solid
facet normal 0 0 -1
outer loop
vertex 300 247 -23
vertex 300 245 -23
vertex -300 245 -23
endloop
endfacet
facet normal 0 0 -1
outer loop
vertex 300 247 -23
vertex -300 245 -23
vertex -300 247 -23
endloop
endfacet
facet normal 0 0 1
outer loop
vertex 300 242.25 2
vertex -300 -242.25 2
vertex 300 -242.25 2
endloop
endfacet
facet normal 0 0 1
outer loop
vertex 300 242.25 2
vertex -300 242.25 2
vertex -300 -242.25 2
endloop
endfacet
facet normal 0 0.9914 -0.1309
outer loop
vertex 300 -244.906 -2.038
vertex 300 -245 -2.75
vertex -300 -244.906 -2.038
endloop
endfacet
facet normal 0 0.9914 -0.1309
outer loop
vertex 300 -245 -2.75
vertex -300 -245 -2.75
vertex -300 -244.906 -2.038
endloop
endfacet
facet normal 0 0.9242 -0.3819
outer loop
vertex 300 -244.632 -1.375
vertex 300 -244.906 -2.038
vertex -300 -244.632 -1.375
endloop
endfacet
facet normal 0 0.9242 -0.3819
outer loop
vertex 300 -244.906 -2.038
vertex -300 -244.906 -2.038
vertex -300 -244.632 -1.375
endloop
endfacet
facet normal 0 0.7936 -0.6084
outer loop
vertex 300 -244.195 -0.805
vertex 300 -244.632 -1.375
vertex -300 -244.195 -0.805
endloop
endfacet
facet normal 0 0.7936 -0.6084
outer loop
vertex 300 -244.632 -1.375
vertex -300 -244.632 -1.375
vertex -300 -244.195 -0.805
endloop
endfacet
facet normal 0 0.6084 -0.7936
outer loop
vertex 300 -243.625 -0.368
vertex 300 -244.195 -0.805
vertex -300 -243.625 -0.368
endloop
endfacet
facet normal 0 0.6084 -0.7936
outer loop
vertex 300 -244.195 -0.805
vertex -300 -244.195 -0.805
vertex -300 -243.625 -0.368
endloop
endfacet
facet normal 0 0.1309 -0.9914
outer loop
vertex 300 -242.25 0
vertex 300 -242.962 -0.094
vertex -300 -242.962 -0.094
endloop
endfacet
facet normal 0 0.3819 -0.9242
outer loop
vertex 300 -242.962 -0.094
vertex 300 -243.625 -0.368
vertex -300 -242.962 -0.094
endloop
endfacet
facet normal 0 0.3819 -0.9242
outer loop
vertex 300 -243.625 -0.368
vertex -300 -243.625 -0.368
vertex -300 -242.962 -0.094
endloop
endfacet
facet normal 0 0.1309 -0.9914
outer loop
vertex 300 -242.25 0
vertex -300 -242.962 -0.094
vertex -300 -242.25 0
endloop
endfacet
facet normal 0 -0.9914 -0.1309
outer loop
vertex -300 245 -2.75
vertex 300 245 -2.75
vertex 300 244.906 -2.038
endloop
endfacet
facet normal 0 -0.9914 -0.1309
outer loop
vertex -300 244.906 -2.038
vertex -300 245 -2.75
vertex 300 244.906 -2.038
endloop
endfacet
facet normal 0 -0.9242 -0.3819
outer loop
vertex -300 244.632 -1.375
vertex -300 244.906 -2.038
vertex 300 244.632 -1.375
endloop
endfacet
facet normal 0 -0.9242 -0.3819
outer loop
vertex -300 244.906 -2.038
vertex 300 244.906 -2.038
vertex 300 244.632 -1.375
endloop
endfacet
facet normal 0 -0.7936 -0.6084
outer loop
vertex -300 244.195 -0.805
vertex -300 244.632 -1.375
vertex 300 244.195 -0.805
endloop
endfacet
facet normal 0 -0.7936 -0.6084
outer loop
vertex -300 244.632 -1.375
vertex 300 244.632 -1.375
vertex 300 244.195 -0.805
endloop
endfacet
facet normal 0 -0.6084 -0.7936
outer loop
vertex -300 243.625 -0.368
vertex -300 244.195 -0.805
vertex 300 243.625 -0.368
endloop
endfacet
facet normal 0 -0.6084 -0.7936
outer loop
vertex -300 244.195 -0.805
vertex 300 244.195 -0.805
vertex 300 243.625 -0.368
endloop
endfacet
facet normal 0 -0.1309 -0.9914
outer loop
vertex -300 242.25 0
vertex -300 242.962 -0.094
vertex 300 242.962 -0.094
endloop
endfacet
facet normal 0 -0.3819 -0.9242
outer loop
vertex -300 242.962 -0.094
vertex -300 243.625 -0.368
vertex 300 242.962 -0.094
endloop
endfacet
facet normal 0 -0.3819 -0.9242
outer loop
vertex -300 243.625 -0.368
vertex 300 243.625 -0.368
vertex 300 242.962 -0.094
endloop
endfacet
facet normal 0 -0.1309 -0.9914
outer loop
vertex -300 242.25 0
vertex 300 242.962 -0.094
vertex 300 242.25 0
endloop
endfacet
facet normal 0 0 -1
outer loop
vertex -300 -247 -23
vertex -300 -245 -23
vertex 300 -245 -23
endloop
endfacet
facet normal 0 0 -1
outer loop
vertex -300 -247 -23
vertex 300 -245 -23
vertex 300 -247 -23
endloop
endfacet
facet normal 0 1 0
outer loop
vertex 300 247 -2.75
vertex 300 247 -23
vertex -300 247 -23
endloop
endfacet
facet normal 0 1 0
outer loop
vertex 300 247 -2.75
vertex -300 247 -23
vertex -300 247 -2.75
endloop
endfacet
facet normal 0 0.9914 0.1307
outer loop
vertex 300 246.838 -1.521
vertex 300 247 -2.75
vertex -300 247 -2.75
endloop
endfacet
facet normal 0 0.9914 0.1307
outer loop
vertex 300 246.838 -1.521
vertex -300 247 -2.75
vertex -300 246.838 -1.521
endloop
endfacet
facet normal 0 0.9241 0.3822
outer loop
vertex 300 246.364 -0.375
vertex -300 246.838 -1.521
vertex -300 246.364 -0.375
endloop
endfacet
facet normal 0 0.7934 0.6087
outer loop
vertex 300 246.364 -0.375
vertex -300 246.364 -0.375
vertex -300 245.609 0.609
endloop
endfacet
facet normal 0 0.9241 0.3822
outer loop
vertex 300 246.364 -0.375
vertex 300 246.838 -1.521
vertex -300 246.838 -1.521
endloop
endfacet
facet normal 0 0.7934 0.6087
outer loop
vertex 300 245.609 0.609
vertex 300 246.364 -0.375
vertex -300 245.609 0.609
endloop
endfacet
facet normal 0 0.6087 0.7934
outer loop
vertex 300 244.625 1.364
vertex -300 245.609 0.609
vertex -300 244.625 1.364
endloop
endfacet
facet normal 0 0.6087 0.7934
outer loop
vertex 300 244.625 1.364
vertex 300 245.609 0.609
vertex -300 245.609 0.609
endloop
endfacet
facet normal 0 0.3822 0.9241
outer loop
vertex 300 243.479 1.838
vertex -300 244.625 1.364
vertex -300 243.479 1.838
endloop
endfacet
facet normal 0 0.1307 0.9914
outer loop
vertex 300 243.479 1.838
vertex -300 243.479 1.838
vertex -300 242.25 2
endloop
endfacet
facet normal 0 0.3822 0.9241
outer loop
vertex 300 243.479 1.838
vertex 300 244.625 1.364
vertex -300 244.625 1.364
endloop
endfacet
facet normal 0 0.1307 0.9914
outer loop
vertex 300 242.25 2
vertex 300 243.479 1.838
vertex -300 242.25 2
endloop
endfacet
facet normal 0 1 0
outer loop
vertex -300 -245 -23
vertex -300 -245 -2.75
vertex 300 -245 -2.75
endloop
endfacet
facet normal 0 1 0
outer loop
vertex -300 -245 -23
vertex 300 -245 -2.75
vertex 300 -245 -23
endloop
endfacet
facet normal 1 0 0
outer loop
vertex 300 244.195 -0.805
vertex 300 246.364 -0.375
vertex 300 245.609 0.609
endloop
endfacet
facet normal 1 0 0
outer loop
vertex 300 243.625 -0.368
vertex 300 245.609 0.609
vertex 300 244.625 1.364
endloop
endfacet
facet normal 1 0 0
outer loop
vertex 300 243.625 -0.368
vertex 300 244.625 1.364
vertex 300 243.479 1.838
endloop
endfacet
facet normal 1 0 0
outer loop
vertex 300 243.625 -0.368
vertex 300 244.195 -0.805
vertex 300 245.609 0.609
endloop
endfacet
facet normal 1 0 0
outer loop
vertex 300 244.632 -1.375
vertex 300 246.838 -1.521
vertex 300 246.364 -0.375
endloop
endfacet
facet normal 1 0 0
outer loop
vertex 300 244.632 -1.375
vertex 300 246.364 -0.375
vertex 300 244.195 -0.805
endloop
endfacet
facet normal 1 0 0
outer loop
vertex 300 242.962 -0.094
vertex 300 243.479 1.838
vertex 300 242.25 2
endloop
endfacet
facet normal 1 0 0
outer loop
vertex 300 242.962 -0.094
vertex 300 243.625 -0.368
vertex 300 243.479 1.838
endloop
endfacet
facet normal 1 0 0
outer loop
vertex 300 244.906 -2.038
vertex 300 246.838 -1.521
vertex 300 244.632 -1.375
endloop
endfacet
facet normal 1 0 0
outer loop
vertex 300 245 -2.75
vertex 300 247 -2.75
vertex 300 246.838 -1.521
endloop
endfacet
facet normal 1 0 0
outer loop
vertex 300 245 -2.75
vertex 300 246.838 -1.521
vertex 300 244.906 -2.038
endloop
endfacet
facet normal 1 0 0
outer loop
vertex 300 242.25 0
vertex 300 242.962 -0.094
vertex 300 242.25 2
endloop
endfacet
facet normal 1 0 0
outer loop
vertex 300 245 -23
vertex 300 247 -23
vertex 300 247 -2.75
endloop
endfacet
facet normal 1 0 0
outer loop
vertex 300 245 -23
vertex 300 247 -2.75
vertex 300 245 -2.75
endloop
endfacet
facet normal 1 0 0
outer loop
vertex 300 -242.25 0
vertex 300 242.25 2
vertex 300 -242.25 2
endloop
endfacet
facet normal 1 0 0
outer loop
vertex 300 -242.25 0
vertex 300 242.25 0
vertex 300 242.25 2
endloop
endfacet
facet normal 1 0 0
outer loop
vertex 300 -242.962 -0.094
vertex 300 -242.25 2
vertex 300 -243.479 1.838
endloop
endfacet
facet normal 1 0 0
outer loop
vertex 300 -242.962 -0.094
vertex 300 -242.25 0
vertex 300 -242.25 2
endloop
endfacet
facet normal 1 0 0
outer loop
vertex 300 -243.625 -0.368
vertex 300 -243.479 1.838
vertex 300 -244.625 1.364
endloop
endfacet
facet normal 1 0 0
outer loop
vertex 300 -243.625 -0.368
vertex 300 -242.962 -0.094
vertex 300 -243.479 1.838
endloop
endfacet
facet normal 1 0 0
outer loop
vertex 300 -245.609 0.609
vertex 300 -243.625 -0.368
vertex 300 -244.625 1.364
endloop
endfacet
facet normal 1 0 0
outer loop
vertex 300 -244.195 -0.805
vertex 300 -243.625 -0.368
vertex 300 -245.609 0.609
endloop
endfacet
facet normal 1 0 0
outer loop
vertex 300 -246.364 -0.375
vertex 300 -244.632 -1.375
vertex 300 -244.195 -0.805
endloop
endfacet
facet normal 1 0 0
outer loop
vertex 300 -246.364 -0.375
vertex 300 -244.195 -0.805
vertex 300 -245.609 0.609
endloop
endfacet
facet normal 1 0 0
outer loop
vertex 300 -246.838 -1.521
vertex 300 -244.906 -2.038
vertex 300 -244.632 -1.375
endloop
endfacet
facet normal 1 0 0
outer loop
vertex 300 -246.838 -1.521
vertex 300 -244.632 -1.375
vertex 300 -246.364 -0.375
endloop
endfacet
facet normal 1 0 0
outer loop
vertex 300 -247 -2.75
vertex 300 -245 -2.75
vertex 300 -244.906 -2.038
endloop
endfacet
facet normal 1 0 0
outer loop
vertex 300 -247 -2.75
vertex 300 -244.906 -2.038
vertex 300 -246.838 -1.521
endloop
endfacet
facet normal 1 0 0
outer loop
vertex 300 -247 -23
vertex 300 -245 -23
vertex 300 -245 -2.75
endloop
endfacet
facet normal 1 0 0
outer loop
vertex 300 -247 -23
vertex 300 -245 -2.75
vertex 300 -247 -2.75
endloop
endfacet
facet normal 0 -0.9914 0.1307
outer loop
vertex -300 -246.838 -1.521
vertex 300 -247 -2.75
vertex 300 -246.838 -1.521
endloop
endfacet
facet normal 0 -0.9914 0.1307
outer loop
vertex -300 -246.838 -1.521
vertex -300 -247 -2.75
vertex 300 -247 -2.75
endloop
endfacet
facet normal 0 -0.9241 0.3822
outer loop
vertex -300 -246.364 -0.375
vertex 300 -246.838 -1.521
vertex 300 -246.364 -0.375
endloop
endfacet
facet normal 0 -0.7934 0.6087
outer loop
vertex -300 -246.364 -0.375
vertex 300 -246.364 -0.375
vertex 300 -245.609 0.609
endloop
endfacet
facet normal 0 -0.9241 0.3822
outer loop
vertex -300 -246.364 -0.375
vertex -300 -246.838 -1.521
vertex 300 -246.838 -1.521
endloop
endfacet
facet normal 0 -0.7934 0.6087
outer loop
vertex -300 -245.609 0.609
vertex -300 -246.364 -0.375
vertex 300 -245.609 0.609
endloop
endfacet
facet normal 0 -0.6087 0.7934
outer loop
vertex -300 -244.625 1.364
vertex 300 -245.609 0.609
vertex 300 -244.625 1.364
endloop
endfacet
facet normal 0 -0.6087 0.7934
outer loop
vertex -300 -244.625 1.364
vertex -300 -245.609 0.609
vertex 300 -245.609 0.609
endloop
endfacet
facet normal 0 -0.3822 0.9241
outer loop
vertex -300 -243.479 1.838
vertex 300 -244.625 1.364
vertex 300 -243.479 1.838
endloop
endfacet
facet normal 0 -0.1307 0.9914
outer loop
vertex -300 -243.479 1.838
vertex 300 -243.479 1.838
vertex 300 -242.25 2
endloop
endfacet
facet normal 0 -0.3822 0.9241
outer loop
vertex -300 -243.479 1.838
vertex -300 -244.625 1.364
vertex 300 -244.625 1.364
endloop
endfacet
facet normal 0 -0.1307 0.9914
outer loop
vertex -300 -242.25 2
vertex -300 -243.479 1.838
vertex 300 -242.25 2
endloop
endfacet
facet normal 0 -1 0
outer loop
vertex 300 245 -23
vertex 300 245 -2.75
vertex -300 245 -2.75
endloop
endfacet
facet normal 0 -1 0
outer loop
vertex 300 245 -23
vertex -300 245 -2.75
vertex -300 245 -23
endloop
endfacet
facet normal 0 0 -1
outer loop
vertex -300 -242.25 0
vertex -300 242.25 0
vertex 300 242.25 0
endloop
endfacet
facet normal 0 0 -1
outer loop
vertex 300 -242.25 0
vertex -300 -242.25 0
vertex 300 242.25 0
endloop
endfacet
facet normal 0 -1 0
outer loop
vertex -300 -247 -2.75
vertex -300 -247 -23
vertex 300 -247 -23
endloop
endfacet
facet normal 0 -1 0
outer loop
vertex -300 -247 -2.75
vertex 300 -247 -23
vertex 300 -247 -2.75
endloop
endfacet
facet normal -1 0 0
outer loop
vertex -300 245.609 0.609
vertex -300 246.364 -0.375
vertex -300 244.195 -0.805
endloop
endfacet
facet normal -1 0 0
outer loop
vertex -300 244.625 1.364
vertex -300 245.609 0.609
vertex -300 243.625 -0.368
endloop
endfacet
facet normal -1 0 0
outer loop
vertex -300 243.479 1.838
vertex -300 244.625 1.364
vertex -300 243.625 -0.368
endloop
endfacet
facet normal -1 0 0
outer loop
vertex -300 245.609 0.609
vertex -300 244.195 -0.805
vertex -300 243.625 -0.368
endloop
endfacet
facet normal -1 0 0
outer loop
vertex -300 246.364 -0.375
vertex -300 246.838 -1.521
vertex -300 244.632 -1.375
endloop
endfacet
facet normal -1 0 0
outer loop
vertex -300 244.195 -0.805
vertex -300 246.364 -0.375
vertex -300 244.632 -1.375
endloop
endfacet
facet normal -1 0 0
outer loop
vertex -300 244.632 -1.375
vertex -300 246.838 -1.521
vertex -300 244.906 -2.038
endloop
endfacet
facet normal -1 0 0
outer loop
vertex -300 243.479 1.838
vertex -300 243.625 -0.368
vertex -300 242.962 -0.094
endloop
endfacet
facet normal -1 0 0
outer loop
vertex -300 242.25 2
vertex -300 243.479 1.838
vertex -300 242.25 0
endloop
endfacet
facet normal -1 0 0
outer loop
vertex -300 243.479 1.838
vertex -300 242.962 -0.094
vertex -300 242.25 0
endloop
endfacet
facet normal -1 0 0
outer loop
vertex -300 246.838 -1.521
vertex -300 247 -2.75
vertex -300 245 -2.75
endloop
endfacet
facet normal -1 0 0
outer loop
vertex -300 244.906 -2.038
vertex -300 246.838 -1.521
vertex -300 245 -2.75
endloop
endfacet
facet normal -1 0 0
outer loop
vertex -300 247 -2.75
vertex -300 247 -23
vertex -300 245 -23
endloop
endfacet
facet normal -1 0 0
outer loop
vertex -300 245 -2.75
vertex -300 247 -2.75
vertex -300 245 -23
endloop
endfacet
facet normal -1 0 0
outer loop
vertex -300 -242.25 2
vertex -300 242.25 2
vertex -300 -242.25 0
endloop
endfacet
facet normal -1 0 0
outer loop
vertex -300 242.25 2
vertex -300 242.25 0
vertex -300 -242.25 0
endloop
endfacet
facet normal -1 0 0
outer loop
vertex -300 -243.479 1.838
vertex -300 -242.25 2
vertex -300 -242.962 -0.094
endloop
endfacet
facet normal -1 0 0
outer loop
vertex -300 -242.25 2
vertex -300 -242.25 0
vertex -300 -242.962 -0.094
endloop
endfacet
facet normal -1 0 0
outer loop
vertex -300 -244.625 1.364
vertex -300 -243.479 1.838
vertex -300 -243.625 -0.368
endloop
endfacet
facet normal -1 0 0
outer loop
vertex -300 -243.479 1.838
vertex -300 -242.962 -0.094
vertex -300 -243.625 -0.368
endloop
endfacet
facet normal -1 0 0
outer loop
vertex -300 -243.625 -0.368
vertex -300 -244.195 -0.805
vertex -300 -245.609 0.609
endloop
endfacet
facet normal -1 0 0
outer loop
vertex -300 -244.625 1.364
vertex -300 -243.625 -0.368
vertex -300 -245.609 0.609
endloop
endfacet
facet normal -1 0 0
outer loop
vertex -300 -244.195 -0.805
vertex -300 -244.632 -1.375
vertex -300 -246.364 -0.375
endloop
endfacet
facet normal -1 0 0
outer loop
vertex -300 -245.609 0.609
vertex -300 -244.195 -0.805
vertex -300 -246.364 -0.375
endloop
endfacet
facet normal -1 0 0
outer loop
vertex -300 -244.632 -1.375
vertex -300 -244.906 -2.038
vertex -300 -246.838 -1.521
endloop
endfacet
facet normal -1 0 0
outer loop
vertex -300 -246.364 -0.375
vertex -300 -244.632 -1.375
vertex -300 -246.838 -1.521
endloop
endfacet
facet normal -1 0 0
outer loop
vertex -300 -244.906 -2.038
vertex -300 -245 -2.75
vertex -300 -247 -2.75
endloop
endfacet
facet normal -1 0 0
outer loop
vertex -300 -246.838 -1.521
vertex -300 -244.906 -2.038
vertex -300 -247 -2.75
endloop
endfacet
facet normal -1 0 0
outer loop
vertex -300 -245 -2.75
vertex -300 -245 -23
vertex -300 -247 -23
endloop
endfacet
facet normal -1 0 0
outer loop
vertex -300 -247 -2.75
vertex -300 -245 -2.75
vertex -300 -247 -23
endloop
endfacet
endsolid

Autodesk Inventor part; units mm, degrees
ref_plane "YZ Plane" through (0, 0, 0) normal (1, 0, 0) x (0, 1, 0)
ref_plane "XZ Plane" through (0, 0, 0) normal (0, 1, 0) x (-1, 0, 0)
ref_plane "XY Plane" through (0, 0, 0) normal (0, 0, 1) x (1, 0, 0)
sketch "Sketch1" plane through (0, 0, 0) normal (0, 0, 1) x (1, 0, 0)
  line L0 (-300, -245) -> (300, -245)
  line L1 (300, -245) -> (300, 245)
  line L2 (300, 245) -> (-300, 245)
  line L3 (-300, 245) -> (-300, -245)
  line L4 (-300, -245) -> (300, 245) construction
  line L5 (300, -245) -> (-300, 245) construction
  point P0 (0, 0)
  dimension "d0" = 600
  dimension "d1" = 490
extrude "Plate1" add sketch "Sketch1" along normal blind 2
sketch "Sketch2" plane through (0, 0, 0) normal (0, 0, -1) x (-1, 0, 0)
  line L0 (-280, 225) -> (-80, 225) construction
  line L1 (-80, 225) -> (-80, 205) construction
  line L2 (-80, 205) -> (-280, 205) construction
  line L3 (-280, 205) -> (-280, 225) construction
  line L4 (-300, 245) -> (300, 245) projected
  line L5 (-300, -245) -> (-300, 245) projected
  point P0 (0, 0)
  point P1 (-48, 100)
  point P2 (300, 245)
  point P3 (-50, 98)
  dimension "d6" = 200
  dimension "d9" = 20
  dimension "d10" = 20
  dimension "d11" = 20
mark "Mark1"
sketch "Sketch3" plane through (-300, 247, 2) normal (0, -1, 0) x (1, 0, 0)
  line L0 (600, 0) -> (0, 0)
  line L1 (0, 0) -> (0, 25)
  line L2 (0, 25) -> (600, 25)
  line L3 (600, 25) -> (600, 0)
edge flange "Flange1" height 25 angle 90 thickness 2 bend radius 2.75 thickness toward (0, -1, 0) relief round relief width 2 relief depth 1 corner gap 2.75 corner form 0 edges at (0, 245, 2) (0, -245, 2) wall of the first edge with corners at (300, 247, 2) (-300, 247, 2) (-300, 247, -23) (300, 247, -23)
bend "Bend1"
corner "Corner1"
equation "\"d2\" = Thickness"
equation "\"d12\" = BendReliefWidth"
equation "\"d13\" = BendReliefDepth"
equation "\"d14\" = MinimumRemnant"
equation "\"d15\" = TransitionRadius"
equation "\"d18\" = BendRadius"
equation "\"d19\" = CornerReliefSize"
equation "\"d20\" = GapSize"
equation "\"d21\" = JacobiRadiusSize"
equation "\"BendReliefWidth\" = Thickness"
equation "\"BendReliefDepth\" = 0.5 * Thickness"
equation "\"CornerReliefSize\" = 4 * Thickness"
equation "\"MinimumRemnant\" = 2 * Thickness"
equation "\"TransitionRadius\" = BendRadius"
equation "\"JacobiRadiusSize\" = BendRadius"
equation "\"GapSize\" = Thickness"
equation "\"Thickness\" = 2"
equation "\"BendRadius\" = 2.75"
properties part number "TRM 025 left board damper" material "AISI 304"
